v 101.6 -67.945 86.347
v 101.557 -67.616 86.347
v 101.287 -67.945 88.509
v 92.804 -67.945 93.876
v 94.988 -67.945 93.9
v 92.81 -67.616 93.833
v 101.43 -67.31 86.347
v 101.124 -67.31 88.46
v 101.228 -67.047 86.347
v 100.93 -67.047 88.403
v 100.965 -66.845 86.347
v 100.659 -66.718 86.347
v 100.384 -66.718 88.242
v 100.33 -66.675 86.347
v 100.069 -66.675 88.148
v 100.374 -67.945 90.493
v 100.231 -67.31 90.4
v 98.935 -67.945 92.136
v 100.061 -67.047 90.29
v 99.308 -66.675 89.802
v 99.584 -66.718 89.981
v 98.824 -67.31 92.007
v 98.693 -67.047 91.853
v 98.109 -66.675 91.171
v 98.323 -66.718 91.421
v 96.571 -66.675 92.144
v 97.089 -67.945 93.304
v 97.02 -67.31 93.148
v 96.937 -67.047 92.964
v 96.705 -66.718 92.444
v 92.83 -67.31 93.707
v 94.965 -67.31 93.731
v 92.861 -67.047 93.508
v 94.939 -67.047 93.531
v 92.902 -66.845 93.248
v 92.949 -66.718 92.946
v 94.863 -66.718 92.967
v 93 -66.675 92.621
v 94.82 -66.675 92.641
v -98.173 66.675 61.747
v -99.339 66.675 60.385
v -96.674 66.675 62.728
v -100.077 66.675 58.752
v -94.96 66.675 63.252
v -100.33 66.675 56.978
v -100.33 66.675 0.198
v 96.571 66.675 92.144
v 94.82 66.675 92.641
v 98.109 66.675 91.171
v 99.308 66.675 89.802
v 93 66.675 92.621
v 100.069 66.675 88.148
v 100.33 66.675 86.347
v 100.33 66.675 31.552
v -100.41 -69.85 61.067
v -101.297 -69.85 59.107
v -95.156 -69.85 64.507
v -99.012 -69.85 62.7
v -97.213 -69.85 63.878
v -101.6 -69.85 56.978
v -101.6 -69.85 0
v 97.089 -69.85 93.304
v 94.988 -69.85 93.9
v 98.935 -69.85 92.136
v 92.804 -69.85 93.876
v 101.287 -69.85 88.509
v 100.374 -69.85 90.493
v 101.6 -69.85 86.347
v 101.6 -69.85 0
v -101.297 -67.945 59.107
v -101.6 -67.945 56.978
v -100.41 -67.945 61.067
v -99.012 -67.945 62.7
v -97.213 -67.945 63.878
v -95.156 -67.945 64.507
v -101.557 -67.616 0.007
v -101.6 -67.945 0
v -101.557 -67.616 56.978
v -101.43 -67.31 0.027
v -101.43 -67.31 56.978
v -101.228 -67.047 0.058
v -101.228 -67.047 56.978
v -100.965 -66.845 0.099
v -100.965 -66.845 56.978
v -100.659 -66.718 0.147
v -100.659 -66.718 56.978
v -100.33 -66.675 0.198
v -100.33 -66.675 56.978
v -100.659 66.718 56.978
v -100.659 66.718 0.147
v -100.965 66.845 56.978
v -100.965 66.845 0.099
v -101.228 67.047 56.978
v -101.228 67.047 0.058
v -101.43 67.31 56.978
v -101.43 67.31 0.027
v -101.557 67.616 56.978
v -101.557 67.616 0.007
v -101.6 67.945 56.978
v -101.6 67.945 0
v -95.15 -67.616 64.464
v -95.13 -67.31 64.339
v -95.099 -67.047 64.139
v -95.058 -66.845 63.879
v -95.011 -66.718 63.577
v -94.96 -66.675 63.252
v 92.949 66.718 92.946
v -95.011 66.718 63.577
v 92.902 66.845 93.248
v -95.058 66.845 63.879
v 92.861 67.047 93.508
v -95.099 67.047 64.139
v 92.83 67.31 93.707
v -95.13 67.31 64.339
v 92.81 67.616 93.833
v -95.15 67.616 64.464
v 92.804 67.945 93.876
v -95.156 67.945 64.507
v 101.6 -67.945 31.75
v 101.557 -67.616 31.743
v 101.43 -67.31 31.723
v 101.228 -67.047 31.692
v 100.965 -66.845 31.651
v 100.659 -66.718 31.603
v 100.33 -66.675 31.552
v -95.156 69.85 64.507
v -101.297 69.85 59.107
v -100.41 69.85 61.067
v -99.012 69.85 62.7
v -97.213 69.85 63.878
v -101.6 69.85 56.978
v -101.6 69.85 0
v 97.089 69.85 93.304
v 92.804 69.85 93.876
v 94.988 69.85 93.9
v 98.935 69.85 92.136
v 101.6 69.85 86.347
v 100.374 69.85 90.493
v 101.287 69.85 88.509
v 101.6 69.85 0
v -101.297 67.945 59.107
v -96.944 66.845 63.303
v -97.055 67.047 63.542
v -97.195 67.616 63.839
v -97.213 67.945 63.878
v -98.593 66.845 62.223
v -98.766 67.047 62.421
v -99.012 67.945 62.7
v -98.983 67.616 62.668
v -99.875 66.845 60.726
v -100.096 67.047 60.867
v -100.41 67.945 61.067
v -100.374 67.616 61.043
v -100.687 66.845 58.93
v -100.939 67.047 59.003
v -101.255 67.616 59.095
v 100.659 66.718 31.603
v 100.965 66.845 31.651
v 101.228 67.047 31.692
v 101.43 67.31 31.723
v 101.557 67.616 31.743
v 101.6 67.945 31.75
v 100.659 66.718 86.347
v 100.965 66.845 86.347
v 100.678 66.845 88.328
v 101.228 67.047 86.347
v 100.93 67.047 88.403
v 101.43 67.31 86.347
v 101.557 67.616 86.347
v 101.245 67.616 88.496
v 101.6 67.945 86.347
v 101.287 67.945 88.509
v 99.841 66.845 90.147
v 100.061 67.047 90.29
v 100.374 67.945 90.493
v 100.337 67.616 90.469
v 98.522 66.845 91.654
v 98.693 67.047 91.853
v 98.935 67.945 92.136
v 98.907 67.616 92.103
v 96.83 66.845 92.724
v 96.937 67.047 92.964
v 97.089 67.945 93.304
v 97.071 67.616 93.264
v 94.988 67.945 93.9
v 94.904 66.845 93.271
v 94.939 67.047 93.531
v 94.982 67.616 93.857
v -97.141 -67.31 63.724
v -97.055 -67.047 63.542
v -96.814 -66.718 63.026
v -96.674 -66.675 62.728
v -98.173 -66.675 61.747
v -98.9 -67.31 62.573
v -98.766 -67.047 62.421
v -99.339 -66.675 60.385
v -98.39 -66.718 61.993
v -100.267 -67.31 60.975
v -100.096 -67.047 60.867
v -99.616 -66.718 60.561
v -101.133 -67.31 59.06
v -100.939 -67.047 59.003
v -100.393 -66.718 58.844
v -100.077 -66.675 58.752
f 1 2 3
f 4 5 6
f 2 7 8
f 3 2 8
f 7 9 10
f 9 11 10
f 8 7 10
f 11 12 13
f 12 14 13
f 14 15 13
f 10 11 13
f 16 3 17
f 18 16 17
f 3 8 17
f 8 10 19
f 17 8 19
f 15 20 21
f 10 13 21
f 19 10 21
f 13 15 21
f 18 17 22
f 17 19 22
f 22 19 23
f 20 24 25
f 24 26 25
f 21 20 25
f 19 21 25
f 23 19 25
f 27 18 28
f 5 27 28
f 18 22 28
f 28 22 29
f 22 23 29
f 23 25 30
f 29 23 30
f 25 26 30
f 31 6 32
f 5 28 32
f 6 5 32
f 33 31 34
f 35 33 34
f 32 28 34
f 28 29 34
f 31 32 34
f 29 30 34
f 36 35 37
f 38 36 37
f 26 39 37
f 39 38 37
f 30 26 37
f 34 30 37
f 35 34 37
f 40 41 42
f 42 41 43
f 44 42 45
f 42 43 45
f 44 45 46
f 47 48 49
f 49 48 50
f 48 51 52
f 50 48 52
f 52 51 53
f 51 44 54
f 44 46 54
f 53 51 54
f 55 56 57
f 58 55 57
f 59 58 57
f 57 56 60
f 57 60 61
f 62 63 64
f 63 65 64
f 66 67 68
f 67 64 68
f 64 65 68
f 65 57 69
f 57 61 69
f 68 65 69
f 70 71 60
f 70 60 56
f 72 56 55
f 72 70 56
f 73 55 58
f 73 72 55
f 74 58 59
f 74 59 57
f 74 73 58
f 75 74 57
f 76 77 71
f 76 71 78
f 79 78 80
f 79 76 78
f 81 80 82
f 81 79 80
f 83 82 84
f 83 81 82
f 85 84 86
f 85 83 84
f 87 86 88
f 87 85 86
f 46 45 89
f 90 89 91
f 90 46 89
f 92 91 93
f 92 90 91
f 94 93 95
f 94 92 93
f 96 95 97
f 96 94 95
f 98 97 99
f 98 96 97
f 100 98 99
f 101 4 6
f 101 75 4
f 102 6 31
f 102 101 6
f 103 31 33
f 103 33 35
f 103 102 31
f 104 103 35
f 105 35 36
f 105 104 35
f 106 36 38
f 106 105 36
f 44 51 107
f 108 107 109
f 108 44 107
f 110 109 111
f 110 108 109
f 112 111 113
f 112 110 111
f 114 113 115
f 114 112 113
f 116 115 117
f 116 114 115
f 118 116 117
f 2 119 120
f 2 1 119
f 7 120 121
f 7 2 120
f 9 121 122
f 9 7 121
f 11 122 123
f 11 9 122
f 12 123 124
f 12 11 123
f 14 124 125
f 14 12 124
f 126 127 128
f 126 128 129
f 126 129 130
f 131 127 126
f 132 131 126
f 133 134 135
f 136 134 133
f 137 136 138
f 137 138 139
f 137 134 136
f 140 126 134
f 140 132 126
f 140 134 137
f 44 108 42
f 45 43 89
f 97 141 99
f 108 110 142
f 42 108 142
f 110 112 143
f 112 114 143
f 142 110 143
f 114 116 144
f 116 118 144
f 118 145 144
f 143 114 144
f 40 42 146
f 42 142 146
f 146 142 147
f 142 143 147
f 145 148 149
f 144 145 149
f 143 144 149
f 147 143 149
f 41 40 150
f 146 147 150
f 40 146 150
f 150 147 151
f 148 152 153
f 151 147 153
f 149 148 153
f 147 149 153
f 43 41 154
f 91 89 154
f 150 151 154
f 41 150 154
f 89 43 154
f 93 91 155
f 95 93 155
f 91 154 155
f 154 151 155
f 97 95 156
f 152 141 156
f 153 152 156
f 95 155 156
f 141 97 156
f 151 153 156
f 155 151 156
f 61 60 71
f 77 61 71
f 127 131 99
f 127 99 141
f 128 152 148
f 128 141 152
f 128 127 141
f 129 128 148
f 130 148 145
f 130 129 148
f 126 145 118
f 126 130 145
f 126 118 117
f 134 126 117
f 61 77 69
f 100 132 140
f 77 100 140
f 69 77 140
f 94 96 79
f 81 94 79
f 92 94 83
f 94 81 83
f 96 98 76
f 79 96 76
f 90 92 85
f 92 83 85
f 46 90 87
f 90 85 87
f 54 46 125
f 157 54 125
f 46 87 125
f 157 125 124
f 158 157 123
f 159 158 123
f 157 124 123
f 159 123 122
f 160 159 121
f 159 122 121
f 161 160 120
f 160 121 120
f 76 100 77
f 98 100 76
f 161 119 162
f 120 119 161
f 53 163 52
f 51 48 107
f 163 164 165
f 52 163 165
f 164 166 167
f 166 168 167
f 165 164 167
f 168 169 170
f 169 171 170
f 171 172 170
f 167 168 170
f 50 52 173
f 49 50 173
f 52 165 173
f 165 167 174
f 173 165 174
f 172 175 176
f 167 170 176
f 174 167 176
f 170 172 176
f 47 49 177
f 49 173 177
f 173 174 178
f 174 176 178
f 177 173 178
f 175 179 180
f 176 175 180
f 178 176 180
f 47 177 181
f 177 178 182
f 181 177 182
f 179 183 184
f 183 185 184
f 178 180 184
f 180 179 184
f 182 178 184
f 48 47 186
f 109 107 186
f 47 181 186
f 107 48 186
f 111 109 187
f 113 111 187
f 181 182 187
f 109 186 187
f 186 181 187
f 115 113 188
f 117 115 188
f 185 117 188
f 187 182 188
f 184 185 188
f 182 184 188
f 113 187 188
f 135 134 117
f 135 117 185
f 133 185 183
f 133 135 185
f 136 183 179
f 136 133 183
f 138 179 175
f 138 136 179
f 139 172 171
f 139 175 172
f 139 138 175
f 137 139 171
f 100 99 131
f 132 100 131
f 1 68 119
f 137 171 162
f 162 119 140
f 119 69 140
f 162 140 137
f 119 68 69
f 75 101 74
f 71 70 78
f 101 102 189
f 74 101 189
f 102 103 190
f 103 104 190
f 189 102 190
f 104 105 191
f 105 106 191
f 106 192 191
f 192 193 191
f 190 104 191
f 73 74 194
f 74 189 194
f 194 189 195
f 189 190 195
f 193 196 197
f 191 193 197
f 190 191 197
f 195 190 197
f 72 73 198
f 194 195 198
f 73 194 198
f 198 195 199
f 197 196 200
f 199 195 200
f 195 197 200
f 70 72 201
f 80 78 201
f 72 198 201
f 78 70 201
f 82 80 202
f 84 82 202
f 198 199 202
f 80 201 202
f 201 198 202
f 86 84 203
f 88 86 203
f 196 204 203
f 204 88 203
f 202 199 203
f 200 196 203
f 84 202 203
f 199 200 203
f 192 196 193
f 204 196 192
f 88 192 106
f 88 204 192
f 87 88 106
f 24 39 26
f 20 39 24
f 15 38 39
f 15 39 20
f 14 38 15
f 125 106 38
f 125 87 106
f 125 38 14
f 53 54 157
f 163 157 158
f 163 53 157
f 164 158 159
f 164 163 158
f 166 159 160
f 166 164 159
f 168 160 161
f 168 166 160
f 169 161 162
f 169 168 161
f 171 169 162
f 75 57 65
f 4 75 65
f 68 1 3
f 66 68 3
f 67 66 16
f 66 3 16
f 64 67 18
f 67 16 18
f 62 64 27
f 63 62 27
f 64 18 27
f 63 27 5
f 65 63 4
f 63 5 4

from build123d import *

# Parameters (mm, degrees)
F0_W     = 203.2
F0_H     = 133.35
F1_DEPTH = 31.75
F3_DEPTH = 133.35
F4_W     = 203.2
F4_H     = 3.175
F5_DEPTH = 95.25
F7_DEPTH = 139.7
F8_R     = 7.62
F9_R     = 1.27


with BuildPart() as f1:
    # F0 (on Top) → F1 (new body)
    with BuildSketch(Plane.XY):
        Rectangle(F0_W, F0_H)
    extrude(amount=F1_DEPTH)

    # F2 (on face) → F3 (cut, through all)
    with BuildSketch(Plane.XZ.offset(66.675)):
        Polygon((-101.6, 31.75), (-101.6, 0), (101.6, 31.75), align=None)
    extrude(amount=-F3_DEPTH, mode=Mode.SUBTRACT)

    # F4 (on Top) → F5 (join)
    with BuildSketch(Plane.XY):
        with Locations((0, 68.2625)):
            Rectangle(F4_W, F4_H)
        with Locations((0, -68.2625)):
            Rectangle(F4_W, F4_H)
    extrude(amount=F5_DEPTH)

    # F6 (on face) → F7 (cut, through all)
    with BuildSketch(Plane.XZ.offset(69.85)):
        Polygon((-101.6, 63.5), (101.6, 95.25), (-101.6, 95.25), align=None)
    extrude(amount=-F7_DEPTH, mode=Mode.SUBTRACT)

    # F8
    f8_edges = [f1.edges().sort_by_distance(p)[0] for p in [
        (101.6, -68.2625, 95.25),
        (101.6, 68.2625, 95.25),
        (-101.6, -68.2625, 63.5),
        (-101.6, 68.2625, 63.5),
    ]]
    fillet(f8_edges, radius=F8_R)

    # F9
    f9_edges = [f1.edges().sort_by_distance(p)[0] for p in [
        (101.6, -66.675, 59.048459),
        (101.6, 66.675, 59.048459),
    ]]
    fillet(f9_edges, radius=F9_R)


solid = f1.part
